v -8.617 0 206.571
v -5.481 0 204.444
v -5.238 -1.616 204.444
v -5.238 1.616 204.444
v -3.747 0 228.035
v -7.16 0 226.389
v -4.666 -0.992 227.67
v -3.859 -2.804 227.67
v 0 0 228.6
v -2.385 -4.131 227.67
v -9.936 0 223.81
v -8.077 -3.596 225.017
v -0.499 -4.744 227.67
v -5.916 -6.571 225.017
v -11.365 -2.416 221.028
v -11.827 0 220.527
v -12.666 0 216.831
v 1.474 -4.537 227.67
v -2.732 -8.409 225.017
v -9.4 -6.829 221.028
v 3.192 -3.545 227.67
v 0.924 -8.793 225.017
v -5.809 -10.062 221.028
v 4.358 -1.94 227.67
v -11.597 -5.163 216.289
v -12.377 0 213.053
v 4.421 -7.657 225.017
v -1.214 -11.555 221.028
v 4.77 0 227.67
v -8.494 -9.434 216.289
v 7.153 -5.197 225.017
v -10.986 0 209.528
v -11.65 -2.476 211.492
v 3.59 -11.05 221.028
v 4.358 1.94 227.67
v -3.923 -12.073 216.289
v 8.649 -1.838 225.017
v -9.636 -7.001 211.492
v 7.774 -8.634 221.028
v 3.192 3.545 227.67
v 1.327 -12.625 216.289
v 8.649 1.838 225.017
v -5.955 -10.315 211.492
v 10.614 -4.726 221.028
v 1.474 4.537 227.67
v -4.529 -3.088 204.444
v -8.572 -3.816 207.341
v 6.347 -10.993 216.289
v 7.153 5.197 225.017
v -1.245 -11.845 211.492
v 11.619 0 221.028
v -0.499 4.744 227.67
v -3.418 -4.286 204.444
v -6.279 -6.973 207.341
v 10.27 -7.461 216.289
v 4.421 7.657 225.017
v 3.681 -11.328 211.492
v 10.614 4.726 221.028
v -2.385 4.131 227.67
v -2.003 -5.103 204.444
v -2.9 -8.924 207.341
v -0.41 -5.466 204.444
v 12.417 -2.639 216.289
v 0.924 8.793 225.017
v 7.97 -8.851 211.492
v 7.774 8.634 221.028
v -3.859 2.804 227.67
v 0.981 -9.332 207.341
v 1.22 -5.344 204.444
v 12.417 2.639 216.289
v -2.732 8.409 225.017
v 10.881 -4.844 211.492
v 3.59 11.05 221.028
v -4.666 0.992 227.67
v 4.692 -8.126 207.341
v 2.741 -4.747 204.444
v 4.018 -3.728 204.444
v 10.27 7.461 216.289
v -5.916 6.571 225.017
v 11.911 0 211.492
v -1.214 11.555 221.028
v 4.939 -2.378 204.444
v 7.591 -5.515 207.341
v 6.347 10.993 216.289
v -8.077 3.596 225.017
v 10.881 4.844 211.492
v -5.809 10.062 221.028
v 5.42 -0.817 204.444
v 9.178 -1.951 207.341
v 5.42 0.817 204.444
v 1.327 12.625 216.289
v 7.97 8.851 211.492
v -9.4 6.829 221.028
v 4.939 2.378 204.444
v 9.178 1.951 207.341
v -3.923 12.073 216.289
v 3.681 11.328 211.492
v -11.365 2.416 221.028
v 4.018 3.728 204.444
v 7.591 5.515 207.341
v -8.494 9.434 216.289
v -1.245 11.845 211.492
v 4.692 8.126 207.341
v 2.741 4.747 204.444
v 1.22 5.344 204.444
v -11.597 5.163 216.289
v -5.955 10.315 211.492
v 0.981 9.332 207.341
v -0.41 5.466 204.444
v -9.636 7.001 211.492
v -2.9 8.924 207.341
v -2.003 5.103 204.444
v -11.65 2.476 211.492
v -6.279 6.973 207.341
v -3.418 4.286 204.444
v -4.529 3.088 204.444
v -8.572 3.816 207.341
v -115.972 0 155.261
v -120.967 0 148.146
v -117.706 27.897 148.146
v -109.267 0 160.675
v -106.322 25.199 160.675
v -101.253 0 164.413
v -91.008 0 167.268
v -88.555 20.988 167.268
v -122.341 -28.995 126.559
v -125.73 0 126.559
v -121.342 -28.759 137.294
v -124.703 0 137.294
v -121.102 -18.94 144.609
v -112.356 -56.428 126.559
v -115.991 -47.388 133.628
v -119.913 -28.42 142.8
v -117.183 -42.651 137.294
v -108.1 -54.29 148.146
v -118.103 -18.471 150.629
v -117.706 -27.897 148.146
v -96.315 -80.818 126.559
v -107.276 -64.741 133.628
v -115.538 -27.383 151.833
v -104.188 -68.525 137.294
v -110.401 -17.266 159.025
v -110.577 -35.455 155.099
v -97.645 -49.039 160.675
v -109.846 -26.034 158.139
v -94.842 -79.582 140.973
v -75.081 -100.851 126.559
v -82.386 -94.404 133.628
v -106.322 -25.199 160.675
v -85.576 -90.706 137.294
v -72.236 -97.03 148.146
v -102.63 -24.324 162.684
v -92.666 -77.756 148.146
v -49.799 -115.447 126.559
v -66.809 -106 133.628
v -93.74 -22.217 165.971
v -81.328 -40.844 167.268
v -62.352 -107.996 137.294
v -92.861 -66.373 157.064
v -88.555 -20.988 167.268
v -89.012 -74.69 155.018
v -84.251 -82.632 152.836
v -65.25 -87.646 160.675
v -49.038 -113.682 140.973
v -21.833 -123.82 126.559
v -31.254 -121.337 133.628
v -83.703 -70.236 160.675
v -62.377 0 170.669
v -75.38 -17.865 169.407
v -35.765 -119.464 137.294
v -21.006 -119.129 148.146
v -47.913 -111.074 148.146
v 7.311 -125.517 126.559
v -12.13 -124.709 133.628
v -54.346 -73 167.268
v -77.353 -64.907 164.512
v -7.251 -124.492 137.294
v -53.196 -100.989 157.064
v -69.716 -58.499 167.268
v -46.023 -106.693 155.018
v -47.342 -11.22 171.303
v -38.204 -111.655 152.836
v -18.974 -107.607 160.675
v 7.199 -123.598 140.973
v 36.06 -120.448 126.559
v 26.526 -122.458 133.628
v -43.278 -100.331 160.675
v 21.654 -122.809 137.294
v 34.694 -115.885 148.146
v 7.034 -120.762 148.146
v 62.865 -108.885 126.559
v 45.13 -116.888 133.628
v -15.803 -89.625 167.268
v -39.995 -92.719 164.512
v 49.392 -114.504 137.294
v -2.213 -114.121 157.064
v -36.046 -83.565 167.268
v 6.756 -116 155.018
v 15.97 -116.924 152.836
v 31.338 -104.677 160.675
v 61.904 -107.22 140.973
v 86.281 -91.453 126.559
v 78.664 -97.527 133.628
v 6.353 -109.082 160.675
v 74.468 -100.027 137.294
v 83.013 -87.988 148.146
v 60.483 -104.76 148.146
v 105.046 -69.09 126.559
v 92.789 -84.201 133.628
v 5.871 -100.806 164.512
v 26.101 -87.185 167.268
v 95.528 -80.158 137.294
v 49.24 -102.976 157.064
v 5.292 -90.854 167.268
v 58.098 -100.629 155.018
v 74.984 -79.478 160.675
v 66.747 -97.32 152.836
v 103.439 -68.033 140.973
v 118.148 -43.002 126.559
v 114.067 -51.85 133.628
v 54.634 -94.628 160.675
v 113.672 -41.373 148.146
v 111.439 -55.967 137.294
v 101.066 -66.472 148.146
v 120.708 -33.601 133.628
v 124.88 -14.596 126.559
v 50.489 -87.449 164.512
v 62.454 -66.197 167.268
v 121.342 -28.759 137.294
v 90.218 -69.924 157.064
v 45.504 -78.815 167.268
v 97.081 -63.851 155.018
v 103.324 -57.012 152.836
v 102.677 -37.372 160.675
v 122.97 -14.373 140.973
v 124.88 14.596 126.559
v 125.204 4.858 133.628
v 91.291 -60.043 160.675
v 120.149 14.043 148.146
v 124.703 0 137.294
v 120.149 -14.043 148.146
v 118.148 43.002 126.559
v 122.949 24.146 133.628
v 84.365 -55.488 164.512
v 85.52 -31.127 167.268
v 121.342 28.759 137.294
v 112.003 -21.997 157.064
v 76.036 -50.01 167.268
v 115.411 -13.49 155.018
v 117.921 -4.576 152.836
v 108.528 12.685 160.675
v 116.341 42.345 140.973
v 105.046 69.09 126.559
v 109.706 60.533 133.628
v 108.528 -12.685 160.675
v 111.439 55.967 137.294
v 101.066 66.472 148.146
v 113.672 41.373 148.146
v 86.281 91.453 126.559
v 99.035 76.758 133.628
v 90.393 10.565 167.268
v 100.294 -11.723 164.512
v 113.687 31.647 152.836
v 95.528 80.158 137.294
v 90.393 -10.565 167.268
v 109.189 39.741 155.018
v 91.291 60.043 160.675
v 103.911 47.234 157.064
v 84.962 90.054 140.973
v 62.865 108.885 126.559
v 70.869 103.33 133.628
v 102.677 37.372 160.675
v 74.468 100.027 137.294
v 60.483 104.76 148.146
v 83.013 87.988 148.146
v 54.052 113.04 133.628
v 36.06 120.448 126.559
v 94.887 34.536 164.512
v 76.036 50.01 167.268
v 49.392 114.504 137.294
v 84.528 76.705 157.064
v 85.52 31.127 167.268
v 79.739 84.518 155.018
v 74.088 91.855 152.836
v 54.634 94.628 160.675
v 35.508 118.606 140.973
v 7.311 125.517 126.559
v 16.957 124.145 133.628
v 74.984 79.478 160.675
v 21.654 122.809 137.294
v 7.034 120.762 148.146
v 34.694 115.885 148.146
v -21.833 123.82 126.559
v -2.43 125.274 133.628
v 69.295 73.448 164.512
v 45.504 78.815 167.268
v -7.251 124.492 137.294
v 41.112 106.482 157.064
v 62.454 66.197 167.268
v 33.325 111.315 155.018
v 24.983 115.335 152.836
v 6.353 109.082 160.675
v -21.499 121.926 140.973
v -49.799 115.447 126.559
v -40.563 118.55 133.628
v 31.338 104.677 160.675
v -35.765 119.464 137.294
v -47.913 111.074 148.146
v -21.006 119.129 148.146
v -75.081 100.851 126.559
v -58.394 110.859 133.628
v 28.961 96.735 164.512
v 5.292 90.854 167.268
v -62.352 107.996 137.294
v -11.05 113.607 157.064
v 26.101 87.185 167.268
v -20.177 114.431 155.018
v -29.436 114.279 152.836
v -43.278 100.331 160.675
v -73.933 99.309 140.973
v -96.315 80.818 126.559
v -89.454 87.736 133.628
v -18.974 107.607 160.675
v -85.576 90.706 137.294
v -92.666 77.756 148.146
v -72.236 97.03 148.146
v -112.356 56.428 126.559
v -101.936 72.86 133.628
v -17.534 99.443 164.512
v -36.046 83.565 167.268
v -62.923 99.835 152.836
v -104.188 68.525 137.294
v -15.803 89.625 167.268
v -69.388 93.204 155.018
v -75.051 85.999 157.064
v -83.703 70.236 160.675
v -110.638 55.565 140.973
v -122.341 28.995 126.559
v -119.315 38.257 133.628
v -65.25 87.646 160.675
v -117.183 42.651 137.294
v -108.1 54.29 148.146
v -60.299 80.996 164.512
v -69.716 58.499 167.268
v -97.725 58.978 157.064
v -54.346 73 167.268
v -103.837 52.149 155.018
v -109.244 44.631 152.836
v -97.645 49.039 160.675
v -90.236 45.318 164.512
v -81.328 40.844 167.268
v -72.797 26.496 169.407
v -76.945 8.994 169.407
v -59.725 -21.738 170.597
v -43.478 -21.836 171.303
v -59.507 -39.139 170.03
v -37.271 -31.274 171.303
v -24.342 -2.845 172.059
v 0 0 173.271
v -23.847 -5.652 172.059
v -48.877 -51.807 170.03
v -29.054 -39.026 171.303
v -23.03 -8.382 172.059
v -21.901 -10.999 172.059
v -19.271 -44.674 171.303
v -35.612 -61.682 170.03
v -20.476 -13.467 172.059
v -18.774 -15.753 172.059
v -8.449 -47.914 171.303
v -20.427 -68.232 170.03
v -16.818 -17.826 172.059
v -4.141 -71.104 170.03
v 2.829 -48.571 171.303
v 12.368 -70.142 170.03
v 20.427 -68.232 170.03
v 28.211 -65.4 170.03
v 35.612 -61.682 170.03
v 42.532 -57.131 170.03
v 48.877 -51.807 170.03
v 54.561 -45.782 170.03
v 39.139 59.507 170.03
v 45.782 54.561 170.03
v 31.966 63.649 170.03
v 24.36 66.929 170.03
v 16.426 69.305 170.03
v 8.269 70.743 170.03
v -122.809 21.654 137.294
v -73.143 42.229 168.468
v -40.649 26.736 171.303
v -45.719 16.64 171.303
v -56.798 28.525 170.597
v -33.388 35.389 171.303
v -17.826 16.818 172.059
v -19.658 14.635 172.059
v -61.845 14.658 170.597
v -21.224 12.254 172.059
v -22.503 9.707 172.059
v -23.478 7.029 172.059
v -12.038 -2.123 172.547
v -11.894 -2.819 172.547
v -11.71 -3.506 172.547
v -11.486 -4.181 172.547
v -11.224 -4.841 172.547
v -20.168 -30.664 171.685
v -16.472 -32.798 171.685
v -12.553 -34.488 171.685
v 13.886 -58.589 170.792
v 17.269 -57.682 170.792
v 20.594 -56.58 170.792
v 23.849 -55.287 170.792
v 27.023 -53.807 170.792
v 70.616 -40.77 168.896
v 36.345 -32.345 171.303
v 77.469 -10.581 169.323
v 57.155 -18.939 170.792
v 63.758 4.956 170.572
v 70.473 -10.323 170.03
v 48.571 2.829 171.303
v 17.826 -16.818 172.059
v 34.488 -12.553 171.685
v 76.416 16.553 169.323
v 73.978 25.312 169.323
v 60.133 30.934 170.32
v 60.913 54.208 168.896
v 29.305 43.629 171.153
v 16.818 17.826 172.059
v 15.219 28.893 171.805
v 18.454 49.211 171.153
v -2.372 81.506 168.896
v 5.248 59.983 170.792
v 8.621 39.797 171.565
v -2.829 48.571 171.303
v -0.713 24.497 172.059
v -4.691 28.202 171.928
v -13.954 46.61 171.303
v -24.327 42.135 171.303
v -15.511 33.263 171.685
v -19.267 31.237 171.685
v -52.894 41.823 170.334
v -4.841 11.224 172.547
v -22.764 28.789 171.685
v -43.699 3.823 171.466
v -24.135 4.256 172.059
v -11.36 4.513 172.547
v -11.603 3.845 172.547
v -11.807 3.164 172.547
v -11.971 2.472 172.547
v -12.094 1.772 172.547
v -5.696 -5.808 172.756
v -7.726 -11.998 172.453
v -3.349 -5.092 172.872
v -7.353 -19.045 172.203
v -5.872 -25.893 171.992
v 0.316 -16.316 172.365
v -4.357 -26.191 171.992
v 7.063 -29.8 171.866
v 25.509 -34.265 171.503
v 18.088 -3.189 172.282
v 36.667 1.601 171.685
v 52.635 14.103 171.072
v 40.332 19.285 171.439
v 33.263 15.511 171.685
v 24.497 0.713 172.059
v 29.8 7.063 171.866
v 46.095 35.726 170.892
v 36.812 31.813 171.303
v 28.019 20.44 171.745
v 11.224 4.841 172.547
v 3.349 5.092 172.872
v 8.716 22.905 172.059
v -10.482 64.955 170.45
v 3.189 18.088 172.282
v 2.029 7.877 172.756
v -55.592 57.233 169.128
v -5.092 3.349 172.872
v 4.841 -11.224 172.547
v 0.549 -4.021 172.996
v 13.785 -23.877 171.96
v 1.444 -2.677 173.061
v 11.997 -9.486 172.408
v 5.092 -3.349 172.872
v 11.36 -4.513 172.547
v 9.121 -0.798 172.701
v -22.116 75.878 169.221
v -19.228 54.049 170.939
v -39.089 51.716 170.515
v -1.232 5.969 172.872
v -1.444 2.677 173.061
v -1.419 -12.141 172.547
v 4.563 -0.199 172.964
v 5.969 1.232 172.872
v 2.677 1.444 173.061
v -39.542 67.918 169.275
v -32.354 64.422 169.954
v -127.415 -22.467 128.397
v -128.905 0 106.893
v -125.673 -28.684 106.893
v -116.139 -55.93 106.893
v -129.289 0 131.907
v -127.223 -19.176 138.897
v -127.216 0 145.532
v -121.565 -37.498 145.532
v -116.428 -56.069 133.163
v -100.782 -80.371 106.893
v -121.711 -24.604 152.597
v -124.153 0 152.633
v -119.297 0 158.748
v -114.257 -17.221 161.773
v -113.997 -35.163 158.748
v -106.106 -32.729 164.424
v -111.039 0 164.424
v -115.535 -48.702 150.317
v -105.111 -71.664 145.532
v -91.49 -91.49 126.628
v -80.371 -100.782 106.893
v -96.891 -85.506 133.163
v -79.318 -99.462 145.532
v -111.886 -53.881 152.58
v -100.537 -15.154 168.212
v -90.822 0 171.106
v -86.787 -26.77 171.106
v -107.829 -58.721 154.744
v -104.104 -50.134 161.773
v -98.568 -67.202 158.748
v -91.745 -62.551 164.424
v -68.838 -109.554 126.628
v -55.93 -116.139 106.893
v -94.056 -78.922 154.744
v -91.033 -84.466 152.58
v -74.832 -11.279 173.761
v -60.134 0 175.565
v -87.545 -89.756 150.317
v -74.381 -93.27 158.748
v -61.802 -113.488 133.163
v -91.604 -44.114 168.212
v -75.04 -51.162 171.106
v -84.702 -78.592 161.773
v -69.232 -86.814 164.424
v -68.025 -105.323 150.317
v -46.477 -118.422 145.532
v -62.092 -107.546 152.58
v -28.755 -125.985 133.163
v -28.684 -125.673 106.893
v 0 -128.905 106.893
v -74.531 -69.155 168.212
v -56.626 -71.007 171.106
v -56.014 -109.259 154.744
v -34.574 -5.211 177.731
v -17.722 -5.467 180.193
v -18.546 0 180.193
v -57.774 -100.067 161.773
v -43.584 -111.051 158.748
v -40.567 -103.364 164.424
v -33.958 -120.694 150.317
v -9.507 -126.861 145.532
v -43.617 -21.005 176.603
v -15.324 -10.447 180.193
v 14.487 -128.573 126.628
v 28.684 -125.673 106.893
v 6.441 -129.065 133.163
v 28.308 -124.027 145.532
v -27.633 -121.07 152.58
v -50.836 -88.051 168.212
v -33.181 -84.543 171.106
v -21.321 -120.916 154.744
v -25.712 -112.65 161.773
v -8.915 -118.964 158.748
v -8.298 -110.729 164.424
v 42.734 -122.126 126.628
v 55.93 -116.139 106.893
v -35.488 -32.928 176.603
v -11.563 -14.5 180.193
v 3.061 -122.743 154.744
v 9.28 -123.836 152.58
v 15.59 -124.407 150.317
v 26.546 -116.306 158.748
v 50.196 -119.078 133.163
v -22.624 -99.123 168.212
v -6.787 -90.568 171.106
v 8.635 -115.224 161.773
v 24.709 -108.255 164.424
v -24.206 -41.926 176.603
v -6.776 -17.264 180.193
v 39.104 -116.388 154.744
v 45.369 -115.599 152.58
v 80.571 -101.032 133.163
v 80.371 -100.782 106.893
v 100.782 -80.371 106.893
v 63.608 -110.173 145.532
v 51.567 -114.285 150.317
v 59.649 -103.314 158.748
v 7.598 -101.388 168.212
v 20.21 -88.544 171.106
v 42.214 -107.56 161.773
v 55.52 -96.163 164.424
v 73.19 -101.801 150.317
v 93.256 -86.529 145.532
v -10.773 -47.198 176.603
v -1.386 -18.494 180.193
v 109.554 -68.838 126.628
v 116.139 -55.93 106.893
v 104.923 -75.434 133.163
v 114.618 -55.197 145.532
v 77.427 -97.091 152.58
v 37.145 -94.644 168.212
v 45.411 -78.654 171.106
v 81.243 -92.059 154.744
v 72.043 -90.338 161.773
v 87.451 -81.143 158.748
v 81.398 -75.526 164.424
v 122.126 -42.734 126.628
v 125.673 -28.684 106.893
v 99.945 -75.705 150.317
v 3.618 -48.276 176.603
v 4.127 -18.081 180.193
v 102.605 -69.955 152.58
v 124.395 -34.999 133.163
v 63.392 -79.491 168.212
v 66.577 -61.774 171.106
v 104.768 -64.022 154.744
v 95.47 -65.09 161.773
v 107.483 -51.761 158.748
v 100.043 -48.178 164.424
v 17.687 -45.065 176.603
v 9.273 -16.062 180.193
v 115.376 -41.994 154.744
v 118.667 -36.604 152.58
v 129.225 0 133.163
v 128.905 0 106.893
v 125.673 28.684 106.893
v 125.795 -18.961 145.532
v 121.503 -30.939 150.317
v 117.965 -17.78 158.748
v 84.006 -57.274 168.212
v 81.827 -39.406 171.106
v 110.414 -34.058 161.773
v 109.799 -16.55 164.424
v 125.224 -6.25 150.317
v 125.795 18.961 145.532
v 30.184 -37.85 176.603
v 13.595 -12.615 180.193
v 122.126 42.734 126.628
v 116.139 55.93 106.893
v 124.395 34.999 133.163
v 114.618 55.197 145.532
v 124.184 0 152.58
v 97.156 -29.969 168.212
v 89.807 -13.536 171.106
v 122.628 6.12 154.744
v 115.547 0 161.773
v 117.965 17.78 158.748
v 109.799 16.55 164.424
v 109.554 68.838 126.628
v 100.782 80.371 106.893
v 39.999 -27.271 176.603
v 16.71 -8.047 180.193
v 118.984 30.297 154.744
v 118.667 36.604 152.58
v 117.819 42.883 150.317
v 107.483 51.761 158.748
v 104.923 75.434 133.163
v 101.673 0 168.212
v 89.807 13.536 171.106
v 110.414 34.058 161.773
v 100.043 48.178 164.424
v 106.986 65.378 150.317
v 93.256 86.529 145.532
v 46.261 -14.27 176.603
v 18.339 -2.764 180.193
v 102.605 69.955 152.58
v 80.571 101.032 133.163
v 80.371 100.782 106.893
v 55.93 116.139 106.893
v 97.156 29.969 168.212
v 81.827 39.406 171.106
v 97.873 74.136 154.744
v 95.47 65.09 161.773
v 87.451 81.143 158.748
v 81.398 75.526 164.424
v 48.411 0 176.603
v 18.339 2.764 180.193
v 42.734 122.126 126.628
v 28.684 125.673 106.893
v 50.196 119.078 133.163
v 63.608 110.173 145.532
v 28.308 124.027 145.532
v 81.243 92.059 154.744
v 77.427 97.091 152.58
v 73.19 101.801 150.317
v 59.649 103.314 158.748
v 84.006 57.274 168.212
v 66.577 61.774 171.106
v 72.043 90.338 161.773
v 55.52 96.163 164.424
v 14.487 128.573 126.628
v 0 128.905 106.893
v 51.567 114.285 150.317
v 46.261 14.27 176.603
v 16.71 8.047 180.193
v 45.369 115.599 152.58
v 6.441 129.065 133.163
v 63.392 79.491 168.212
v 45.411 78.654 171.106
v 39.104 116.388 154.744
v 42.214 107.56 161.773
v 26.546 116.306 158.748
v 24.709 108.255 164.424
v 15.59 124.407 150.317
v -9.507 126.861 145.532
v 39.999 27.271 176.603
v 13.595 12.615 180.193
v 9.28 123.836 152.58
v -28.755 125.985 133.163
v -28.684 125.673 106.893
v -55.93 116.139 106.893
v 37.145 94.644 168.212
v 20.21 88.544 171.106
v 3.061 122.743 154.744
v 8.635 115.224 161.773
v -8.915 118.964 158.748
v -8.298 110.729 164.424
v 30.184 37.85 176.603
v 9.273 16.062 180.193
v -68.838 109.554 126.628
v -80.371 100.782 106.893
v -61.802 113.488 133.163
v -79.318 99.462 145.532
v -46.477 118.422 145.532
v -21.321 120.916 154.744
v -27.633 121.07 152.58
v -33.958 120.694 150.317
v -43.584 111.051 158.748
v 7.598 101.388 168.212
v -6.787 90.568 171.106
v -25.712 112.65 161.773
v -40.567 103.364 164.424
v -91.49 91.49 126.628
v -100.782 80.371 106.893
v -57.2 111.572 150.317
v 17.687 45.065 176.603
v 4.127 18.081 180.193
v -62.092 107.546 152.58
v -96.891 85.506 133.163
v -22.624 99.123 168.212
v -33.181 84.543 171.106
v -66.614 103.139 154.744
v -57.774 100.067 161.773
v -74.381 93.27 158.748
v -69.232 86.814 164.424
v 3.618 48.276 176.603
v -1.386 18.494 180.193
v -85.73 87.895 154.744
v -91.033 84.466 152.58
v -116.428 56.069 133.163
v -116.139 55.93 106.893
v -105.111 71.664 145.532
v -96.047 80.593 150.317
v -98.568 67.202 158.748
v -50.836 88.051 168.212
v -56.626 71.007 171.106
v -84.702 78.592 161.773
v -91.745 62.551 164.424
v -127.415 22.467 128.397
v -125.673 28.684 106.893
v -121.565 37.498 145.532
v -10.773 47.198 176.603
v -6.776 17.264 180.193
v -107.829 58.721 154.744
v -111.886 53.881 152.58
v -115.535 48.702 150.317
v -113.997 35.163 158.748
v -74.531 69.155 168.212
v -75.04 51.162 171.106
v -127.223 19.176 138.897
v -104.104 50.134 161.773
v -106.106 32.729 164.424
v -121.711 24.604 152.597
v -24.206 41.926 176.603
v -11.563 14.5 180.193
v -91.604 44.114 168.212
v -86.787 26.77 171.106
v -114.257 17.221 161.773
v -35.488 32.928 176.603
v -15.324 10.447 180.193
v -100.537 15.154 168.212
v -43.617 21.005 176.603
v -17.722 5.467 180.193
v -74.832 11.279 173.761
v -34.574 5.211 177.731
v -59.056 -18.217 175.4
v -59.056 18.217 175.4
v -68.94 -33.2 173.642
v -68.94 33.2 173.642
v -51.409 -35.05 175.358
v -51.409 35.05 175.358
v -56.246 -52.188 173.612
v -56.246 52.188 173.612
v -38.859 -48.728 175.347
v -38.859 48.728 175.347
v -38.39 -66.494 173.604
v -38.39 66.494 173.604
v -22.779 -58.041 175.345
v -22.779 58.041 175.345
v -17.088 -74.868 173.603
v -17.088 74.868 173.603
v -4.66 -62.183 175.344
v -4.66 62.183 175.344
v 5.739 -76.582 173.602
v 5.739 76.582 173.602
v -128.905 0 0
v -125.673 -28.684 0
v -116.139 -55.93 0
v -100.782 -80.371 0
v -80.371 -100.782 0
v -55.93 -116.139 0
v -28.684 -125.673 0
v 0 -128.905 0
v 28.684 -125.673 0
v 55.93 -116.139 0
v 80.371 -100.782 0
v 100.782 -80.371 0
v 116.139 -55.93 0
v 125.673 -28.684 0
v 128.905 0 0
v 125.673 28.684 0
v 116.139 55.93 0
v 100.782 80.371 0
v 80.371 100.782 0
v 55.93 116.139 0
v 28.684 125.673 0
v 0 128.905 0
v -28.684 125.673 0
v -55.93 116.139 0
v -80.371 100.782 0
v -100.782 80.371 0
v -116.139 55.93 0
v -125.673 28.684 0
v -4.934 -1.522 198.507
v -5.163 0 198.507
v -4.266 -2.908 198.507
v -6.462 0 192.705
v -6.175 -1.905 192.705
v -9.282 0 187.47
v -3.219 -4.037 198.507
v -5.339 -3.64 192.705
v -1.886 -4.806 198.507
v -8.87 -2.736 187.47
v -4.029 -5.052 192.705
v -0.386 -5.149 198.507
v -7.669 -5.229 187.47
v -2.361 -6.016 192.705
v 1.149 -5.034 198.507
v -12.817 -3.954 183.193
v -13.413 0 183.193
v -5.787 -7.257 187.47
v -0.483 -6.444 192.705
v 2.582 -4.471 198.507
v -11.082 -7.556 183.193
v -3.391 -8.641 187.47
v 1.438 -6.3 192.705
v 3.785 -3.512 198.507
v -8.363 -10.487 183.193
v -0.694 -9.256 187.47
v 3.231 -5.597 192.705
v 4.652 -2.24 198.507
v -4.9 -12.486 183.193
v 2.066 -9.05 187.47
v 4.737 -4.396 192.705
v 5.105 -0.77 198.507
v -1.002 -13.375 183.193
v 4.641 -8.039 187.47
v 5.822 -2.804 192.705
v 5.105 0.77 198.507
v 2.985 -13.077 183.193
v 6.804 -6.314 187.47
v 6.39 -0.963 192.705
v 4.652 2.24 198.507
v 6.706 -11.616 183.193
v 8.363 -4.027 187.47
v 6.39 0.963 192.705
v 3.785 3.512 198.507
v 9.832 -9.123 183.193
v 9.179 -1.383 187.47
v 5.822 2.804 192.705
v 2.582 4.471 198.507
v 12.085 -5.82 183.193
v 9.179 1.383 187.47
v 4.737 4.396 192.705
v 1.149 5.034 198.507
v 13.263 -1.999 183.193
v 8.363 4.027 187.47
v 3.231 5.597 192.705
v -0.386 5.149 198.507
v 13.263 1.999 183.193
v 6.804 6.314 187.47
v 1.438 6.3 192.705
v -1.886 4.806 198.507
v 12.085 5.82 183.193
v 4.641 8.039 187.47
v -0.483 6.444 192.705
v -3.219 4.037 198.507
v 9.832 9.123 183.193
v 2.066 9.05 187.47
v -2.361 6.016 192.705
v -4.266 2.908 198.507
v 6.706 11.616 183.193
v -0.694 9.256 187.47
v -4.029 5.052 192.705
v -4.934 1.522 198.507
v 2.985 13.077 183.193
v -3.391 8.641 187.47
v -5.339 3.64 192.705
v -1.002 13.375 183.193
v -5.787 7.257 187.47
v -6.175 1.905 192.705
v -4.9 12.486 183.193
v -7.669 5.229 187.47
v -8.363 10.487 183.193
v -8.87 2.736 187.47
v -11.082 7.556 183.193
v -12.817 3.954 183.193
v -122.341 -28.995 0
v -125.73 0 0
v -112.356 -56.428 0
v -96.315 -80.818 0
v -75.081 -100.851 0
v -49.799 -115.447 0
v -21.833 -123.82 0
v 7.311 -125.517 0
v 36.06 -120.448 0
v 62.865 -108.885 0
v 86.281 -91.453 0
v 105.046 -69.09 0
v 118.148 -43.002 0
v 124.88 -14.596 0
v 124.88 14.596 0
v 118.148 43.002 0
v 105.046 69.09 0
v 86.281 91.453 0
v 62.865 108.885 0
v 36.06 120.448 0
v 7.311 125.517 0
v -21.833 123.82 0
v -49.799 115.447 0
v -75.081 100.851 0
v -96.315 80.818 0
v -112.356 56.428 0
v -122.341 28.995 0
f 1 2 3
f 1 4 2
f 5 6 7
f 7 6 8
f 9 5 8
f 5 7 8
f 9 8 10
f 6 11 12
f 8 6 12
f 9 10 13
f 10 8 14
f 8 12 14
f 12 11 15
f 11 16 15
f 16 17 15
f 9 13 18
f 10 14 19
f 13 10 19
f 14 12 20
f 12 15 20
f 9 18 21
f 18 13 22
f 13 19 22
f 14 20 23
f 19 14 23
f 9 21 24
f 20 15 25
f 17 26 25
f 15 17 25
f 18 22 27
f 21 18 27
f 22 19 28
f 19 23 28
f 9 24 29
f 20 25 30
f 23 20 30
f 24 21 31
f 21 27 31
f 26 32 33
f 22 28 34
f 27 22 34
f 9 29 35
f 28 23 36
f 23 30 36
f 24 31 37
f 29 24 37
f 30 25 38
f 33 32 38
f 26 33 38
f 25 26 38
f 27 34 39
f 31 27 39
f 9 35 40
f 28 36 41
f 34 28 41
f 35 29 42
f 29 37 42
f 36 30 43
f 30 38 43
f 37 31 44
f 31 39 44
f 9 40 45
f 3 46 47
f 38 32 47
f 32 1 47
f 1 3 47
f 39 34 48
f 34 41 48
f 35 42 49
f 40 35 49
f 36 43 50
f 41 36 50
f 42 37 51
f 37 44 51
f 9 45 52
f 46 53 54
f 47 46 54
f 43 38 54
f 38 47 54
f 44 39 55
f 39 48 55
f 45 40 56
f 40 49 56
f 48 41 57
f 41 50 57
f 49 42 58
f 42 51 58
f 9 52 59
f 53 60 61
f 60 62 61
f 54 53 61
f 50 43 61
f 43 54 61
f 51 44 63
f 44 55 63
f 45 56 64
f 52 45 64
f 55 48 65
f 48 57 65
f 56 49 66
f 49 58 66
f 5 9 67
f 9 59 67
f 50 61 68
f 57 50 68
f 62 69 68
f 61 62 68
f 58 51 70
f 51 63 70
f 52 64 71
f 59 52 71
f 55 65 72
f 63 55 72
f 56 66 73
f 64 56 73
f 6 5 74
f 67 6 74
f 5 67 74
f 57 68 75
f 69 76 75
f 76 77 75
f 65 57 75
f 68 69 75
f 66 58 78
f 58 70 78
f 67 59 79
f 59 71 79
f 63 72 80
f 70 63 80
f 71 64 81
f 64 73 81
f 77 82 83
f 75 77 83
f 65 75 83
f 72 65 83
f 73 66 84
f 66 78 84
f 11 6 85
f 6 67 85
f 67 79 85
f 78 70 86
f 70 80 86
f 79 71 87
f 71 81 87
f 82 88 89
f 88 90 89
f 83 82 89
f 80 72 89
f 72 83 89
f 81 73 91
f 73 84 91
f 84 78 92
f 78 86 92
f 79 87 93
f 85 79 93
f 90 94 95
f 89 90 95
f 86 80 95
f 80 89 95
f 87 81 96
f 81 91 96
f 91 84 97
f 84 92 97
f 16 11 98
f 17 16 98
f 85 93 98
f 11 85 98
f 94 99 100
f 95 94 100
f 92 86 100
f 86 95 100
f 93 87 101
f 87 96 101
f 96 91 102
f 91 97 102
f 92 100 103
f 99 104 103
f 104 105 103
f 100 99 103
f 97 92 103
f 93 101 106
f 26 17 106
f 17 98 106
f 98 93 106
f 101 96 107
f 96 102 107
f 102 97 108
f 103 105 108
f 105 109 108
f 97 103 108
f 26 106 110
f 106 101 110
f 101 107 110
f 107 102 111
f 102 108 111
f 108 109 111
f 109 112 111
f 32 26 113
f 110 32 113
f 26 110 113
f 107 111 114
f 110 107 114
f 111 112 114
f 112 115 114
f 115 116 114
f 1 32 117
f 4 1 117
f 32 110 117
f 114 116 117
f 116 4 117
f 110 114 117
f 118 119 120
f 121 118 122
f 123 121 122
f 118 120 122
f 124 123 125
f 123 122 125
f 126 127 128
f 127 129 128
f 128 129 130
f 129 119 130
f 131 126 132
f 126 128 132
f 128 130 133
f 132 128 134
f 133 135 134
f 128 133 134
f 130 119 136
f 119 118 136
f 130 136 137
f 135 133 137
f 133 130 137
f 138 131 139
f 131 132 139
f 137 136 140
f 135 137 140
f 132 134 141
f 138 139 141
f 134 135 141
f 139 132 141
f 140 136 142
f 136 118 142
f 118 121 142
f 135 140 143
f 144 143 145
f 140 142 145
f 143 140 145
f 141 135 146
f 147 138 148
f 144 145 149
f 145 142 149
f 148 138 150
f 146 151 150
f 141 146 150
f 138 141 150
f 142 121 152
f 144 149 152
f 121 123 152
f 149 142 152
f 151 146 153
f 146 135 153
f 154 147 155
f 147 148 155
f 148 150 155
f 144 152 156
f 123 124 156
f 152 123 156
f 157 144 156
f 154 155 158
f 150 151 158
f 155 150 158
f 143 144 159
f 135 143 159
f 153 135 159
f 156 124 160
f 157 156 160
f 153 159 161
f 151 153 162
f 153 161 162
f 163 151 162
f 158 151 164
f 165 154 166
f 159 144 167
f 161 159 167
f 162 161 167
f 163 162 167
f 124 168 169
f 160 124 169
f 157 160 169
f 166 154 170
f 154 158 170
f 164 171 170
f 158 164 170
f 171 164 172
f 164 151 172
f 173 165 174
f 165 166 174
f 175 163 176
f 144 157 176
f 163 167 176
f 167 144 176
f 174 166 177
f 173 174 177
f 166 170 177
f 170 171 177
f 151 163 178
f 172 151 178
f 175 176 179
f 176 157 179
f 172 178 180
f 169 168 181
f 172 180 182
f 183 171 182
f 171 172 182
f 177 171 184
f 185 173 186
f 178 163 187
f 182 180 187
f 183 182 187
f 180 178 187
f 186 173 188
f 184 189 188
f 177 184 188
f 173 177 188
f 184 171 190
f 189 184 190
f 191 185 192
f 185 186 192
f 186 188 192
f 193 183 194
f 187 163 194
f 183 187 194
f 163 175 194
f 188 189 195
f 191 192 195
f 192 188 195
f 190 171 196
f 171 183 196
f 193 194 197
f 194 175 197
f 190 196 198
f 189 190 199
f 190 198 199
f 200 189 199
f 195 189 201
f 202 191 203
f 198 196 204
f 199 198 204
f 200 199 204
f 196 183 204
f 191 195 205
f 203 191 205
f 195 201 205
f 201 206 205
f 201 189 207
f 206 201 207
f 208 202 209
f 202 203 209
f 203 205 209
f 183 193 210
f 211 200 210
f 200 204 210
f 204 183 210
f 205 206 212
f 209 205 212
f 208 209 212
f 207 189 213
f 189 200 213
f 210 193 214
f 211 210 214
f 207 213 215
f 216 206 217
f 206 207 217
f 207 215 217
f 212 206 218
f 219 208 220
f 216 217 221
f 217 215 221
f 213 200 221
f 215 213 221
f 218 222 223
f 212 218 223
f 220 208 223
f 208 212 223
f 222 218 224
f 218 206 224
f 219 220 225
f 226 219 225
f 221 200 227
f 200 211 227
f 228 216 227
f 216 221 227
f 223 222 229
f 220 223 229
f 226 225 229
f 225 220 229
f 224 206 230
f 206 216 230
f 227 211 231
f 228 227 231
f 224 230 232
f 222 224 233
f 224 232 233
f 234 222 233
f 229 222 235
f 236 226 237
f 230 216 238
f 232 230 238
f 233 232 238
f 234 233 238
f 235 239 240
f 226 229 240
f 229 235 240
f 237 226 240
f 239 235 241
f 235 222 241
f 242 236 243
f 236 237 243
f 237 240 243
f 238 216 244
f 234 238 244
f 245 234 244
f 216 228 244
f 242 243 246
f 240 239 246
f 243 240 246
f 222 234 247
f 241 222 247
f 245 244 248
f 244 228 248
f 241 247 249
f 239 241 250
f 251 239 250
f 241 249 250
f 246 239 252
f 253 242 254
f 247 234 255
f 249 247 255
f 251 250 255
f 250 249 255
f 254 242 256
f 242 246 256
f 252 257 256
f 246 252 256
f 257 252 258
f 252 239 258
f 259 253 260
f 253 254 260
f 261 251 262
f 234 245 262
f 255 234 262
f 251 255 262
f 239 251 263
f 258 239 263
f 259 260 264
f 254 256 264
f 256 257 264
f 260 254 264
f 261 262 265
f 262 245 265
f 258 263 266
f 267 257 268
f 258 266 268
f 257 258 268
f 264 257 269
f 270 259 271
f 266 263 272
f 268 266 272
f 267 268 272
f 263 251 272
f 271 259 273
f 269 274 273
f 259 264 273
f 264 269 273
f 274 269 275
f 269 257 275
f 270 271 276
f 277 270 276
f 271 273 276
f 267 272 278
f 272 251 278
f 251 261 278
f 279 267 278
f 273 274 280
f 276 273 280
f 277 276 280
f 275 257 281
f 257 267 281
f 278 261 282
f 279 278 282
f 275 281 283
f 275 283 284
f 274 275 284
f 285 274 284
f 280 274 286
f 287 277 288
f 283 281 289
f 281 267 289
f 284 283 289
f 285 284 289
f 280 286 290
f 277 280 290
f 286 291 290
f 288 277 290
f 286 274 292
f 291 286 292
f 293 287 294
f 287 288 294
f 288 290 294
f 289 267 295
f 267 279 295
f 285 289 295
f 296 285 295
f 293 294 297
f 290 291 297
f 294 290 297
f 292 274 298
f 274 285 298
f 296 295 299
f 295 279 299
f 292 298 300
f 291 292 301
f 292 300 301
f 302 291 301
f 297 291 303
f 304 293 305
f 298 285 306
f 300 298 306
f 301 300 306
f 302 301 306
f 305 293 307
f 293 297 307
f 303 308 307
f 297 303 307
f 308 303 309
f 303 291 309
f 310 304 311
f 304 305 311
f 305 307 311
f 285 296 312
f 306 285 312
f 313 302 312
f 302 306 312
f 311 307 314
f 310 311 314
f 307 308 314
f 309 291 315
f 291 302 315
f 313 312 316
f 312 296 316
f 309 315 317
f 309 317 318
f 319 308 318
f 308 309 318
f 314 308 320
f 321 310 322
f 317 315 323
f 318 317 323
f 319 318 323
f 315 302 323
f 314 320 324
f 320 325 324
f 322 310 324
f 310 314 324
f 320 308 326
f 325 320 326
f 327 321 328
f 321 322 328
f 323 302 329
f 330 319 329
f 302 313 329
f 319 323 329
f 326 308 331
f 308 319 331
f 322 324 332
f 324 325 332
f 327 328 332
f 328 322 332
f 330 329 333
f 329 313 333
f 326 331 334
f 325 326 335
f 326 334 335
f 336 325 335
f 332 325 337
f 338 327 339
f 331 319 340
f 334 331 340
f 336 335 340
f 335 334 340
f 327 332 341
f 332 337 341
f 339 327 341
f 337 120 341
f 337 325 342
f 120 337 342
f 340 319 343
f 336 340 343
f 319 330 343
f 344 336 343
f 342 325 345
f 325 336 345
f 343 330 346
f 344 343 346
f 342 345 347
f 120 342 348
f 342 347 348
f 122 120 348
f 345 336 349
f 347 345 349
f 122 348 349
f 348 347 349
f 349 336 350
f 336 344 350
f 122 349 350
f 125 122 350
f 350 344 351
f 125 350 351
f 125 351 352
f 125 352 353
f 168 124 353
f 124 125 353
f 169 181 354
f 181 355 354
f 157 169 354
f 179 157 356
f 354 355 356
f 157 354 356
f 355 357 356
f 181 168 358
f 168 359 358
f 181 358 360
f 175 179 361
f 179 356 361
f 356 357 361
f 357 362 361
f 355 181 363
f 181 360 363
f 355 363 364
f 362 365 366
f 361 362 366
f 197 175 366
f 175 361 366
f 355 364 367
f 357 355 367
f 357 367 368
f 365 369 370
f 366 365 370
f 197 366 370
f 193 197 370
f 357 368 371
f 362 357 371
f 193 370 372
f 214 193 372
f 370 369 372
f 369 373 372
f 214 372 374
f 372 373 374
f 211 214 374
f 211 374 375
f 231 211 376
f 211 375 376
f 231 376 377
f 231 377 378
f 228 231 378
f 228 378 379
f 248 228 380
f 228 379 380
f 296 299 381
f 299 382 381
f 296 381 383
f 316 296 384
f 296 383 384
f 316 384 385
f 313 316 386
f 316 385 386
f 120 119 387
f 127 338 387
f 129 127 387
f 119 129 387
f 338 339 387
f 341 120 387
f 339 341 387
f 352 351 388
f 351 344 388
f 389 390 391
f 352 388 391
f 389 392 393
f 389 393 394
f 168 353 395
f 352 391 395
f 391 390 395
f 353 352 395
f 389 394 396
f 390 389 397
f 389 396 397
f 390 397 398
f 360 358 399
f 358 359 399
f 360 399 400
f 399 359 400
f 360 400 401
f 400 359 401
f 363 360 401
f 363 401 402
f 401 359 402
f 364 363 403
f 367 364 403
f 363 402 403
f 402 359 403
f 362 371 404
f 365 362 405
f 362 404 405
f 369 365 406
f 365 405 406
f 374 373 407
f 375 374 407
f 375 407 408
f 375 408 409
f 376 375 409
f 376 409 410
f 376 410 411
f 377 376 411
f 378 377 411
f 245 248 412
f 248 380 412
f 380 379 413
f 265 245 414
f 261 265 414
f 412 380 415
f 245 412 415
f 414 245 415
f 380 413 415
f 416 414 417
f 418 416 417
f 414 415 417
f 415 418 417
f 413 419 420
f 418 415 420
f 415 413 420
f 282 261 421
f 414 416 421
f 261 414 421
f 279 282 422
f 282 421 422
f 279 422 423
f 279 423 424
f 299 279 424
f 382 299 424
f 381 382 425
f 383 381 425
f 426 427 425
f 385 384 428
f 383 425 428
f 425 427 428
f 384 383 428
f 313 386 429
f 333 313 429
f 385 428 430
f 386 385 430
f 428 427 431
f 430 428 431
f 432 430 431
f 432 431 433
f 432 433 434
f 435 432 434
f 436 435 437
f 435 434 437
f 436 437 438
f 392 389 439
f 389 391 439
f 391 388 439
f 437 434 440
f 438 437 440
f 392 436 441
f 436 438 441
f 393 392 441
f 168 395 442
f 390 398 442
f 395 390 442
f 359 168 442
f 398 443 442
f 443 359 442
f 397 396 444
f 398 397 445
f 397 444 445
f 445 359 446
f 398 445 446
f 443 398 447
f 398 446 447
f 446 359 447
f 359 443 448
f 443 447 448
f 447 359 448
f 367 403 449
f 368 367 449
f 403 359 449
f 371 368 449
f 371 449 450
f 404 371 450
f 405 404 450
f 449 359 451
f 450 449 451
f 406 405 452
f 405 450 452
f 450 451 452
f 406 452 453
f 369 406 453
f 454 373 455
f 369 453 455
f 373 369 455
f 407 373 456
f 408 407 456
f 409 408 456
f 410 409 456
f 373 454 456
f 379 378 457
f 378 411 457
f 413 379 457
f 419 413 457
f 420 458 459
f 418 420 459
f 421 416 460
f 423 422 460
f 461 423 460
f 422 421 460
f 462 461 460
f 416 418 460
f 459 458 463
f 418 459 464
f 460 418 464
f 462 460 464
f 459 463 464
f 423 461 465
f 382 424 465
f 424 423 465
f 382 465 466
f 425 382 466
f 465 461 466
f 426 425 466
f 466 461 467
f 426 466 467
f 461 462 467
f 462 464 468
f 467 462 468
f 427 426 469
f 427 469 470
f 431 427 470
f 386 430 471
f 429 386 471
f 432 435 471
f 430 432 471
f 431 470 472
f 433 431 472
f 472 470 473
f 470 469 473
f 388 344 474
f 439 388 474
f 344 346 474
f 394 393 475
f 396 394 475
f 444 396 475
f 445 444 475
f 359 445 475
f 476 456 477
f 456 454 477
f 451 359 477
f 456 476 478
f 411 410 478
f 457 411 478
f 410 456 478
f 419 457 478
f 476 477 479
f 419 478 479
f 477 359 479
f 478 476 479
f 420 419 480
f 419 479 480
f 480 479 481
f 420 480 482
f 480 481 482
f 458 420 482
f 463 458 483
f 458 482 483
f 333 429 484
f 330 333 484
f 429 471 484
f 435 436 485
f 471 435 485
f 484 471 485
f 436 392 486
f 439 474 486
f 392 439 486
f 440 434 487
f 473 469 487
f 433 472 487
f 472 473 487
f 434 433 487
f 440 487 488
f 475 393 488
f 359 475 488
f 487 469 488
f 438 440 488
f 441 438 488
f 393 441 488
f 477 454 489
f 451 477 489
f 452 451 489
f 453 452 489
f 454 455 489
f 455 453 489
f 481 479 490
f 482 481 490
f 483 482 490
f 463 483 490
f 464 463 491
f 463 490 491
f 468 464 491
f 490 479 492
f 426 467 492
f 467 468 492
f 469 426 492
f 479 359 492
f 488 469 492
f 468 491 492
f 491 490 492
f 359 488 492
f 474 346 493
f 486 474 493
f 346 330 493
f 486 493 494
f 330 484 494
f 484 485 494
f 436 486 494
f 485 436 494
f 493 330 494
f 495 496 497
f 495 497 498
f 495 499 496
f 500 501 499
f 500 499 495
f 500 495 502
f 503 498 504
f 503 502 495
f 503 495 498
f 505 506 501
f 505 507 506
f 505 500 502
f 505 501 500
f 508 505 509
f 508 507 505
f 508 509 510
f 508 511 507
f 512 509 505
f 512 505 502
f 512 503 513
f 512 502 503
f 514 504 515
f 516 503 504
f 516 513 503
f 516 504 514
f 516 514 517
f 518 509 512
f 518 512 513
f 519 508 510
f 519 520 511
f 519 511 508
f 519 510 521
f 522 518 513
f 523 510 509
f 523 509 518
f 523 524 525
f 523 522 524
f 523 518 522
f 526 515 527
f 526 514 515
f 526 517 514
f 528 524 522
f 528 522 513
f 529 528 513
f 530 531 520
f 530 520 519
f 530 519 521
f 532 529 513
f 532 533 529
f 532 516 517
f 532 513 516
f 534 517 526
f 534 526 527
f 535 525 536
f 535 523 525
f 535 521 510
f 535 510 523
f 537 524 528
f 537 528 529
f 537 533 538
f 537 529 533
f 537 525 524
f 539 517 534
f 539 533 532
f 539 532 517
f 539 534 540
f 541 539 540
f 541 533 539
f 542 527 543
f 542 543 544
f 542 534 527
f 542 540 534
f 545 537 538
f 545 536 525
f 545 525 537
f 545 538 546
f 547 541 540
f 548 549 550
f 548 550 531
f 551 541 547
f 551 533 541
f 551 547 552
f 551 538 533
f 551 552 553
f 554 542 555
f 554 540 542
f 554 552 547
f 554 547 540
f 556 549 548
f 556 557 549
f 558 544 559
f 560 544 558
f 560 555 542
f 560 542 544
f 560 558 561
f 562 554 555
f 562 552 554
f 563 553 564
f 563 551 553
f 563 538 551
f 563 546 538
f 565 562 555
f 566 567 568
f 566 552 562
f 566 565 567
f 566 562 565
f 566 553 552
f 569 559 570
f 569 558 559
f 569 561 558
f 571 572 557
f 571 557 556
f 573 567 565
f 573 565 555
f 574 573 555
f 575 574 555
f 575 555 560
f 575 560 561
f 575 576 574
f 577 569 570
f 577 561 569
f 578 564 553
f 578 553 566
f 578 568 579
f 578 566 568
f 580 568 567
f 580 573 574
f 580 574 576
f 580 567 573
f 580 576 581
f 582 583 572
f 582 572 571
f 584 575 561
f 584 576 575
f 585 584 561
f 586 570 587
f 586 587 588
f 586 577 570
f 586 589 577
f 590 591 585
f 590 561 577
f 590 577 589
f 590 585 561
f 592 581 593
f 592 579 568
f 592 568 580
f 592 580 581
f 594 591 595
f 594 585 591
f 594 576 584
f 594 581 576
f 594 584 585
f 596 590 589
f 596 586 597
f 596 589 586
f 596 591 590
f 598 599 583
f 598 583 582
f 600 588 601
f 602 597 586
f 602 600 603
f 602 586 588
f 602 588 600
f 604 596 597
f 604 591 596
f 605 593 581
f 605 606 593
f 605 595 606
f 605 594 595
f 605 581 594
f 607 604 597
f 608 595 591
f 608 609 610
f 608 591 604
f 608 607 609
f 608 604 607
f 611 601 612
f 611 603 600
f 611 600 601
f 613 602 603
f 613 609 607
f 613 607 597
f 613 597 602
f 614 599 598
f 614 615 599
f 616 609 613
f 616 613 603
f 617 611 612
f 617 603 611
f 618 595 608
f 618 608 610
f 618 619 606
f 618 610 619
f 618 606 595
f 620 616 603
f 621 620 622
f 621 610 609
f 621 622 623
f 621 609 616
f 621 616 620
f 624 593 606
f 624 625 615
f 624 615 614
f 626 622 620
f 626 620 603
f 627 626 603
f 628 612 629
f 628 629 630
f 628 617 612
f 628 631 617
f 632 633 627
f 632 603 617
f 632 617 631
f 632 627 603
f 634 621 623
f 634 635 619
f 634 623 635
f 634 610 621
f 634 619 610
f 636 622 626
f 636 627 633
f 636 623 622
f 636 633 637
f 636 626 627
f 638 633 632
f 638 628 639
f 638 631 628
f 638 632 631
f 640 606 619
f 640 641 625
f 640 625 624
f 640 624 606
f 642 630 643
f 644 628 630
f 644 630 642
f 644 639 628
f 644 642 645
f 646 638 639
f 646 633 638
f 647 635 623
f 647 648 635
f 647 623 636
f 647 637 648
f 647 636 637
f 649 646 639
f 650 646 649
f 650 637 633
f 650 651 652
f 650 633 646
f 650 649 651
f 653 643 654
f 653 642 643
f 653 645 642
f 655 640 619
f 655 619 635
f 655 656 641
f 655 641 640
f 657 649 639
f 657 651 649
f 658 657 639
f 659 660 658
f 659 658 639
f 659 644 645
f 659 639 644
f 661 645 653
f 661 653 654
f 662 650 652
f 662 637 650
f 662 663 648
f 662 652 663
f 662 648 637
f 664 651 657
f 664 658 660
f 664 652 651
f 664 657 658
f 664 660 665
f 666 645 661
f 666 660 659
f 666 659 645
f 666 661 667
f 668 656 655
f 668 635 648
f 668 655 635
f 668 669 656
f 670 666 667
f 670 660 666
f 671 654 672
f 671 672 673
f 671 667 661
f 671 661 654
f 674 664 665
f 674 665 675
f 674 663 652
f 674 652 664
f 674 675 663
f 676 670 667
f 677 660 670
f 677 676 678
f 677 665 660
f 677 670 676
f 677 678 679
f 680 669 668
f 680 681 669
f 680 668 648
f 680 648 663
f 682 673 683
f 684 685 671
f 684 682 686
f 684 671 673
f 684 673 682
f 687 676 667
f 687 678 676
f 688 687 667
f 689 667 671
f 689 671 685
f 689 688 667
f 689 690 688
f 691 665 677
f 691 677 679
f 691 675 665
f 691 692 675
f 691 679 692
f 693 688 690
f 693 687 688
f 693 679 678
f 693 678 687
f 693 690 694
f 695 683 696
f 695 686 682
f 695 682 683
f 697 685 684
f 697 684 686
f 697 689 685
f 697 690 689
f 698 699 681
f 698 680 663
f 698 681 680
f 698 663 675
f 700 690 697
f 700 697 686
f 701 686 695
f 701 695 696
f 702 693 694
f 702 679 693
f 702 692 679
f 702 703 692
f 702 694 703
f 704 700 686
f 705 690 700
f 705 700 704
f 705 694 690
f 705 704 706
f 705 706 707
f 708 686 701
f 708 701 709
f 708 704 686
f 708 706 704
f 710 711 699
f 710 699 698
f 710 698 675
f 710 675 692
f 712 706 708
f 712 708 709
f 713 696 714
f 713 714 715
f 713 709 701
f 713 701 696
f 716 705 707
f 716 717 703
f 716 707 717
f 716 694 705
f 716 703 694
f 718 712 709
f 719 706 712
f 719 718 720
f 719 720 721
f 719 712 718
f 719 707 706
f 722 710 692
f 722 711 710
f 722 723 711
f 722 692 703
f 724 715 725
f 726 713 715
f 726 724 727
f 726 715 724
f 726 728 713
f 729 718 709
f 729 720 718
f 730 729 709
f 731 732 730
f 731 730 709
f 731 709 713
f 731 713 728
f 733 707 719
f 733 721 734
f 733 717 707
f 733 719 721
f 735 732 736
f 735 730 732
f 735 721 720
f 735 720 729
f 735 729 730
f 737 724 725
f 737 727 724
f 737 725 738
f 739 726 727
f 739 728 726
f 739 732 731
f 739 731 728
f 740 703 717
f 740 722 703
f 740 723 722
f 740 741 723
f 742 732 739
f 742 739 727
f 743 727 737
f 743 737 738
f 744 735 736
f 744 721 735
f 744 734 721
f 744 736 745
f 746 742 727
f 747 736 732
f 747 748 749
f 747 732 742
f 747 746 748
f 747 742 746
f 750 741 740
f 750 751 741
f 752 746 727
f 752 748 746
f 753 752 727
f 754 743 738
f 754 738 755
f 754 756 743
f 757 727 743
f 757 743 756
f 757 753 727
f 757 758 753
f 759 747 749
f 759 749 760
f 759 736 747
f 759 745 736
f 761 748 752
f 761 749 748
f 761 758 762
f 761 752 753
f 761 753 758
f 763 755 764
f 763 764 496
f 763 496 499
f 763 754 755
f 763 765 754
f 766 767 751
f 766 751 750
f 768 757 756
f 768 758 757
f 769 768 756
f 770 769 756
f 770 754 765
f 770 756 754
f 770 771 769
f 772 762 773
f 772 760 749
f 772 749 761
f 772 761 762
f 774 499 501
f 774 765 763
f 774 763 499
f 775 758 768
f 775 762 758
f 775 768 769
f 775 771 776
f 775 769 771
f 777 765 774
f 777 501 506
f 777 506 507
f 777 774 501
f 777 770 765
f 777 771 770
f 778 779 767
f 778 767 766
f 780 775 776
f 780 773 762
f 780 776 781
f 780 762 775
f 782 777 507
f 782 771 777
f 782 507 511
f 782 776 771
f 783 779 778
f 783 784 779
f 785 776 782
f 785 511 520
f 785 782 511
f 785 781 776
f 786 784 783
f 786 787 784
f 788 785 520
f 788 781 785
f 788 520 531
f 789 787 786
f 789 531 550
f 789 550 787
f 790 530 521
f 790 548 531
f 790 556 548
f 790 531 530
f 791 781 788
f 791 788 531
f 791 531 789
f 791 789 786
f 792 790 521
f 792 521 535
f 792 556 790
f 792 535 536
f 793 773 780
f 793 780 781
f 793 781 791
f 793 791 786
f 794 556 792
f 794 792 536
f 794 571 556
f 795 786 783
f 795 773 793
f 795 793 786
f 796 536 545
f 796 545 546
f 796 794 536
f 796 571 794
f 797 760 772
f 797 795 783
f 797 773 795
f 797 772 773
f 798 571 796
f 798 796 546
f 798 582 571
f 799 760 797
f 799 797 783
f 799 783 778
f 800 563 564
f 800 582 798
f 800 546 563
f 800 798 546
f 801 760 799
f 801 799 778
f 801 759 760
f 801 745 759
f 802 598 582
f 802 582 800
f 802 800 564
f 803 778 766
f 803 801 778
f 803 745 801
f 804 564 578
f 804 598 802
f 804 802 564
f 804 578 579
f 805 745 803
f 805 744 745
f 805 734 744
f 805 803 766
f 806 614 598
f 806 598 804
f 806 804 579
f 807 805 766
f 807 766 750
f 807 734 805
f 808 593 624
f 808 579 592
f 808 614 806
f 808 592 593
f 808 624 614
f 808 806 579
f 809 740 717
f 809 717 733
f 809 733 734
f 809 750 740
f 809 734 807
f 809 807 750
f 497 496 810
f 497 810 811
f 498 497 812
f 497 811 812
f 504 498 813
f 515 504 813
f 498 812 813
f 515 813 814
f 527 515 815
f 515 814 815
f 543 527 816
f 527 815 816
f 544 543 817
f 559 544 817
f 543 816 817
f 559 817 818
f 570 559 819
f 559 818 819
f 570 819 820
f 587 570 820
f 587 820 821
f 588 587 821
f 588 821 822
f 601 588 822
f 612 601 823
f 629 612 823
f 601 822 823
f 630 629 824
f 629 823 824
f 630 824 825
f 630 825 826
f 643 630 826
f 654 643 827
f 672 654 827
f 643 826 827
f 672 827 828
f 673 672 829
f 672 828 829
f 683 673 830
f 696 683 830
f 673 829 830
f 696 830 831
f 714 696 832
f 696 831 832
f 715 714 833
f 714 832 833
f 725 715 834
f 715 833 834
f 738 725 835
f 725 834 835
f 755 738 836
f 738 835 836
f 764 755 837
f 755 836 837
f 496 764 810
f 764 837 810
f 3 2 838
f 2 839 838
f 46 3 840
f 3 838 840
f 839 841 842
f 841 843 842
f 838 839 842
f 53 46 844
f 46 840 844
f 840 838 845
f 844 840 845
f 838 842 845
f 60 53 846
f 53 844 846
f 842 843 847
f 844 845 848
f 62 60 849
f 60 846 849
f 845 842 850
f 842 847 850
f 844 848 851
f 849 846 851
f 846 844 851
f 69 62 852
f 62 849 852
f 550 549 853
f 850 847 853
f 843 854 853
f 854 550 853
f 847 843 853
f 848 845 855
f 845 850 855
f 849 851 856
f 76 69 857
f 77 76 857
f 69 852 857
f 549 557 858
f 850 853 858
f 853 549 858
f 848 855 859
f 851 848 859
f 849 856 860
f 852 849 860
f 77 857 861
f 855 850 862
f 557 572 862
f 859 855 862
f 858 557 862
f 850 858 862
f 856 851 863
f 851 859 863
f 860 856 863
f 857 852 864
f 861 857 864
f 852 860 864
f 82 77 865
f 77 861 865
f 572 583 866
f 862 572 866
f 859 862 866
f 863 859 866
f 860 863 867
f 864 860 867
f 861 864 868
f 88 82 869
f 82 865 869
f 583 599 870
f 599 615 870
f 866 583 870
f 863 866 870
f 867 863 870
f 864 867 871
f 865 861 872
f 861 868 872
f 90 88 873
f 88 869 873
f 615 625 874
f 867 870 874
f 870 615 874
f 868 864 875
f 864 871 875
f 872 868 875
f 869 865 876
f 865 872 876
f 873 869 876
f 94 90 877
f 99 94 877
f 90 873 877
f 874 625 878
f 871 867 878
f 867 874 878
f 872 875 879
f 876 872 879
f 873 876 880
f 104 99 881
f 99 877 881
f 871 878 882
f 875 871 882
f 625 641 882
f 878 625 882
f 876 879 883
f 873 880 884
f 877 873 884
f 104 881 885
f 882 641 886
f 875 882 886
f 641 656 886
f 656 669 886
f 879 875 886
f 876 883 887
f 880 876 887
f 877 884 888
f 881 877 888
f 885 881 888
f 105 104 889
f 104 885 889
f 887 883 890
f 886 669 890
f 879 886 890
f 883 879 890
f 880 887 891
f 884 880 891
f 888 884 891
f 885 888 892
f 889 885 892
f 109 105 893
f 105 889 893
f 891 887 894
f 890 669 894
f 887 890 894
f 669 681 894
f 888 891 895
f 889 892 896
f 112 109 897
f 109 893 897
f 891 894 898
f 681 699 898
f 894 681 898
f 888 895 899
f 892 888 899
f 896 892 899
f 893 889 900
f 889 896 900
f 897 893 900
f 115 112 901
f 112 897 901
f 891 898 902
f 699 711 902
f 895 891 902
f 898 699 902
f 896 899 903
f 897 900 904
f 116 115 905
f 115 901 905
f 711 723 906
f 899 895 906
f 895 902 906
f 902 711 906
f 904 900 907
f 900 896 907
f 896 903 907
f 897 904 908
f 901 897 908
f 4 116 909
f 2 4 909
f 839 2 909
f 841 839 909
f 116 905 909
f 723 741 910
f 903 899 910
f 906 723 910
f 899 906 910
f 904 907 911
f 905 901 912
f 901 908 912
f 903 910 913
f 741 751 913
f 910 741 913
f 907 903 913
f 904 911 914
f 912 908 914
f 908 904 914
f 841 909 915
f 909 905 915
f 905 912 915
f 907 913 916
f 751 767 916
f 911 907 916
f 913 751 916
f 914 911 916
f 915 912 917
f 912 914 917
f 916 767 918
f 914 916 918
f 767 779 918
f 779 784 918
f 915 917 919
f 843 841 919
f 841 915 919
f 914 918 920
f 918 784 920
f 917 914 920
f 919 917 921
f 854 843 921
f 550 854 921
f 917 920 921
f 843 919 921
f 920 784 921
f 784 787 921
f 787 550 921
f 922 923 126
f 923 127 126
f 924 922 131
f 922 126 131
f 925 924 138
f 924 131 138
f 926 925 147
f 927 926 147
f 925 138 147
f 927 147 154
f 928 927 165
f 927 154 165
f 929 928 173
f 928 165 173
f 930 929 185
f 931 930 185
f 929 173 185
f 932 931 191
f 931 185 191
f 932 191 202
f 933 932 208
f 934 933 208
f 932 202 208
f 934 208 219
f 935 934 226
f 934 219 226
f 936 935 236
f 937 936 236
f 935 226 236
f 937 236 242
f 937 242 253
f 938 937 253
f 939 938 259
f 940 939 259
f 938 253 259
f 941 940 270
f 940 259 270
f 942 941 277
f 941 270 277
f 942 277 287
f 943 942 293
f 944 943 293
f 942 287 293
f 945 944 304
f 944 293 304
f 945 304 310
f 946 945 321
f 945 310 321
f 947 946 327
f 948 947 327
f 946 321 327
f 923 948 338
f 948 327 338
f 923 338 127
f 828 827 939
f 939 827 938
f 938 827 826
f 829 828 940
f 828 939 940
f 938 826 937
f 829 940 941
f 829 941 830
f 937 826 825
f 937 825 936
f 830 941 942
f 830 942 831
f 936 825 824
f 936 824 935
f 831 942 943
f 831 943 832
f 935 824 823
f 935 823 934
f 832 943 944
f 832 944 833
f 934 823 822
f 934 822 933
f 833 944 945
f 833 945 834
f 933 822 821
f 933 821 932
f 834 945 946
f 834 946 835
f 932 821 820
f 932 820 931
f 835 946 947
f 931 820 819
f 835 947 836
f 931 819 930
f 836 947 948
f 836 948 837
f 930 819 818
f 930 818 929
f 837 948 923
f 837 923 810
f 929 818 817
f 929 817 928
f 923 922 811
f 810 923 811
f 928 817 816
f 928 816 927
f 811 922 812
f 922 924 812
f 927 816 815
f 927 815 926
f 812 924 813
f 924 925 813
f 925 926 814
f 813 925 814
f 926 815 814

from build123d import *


with BuildPart() as f1:
    # F0 (on Front) → F1 (revolve)
    with BuildSketch(Plane.XZ):
        with BuildLine():
            Line((-128.905, 106.8930508455), (-128.905, 0))
            Line((-128.905, 0), (-125.73, 0))
            Line((-125.73, 0), (-125.73, 126.5592618573))
            add(Edge.make_bspline(
                [(-125.73, 126.5592618573), (-125.73, 137.5592263703), (-117.3675938619, 175.8535419895), (-43.2346528038, 170.1313743134), (0, 173.2708198017)],
                knots=[0, 0, 0, 0, 0.3622196404, 1, 1, 1, 1], degree=3))
            Line((0, 173.2708198017), (0, 228.6))
            ThreePointArc((0, 228.6), (-12.3851340936, 218.7104187382), (-5.4814823514, 204.4438509423))
            ThreePointArc((-5.4814823514, 204.4438509423), (-7.6929026142, 189.9906849013), (-18.546248265, 180.1932731832))
            add(Edge.make_bspline(
                [(-128.905, 106.8930508455), (-128.905, 126.4129957464), (-138.9272535609, 179.3268166787), (-32.7060964034, 175.5422530476), (-18.546248265, 180.1932731832)],
                knots=[0, 0, 0, 0, 0.4286406106, 1, 1, 1, 1], degree=3))
        make_face()
    revolve(axis=Axis((0, 0, 114.3), (0, 0, 1)))


solid = f1.part
